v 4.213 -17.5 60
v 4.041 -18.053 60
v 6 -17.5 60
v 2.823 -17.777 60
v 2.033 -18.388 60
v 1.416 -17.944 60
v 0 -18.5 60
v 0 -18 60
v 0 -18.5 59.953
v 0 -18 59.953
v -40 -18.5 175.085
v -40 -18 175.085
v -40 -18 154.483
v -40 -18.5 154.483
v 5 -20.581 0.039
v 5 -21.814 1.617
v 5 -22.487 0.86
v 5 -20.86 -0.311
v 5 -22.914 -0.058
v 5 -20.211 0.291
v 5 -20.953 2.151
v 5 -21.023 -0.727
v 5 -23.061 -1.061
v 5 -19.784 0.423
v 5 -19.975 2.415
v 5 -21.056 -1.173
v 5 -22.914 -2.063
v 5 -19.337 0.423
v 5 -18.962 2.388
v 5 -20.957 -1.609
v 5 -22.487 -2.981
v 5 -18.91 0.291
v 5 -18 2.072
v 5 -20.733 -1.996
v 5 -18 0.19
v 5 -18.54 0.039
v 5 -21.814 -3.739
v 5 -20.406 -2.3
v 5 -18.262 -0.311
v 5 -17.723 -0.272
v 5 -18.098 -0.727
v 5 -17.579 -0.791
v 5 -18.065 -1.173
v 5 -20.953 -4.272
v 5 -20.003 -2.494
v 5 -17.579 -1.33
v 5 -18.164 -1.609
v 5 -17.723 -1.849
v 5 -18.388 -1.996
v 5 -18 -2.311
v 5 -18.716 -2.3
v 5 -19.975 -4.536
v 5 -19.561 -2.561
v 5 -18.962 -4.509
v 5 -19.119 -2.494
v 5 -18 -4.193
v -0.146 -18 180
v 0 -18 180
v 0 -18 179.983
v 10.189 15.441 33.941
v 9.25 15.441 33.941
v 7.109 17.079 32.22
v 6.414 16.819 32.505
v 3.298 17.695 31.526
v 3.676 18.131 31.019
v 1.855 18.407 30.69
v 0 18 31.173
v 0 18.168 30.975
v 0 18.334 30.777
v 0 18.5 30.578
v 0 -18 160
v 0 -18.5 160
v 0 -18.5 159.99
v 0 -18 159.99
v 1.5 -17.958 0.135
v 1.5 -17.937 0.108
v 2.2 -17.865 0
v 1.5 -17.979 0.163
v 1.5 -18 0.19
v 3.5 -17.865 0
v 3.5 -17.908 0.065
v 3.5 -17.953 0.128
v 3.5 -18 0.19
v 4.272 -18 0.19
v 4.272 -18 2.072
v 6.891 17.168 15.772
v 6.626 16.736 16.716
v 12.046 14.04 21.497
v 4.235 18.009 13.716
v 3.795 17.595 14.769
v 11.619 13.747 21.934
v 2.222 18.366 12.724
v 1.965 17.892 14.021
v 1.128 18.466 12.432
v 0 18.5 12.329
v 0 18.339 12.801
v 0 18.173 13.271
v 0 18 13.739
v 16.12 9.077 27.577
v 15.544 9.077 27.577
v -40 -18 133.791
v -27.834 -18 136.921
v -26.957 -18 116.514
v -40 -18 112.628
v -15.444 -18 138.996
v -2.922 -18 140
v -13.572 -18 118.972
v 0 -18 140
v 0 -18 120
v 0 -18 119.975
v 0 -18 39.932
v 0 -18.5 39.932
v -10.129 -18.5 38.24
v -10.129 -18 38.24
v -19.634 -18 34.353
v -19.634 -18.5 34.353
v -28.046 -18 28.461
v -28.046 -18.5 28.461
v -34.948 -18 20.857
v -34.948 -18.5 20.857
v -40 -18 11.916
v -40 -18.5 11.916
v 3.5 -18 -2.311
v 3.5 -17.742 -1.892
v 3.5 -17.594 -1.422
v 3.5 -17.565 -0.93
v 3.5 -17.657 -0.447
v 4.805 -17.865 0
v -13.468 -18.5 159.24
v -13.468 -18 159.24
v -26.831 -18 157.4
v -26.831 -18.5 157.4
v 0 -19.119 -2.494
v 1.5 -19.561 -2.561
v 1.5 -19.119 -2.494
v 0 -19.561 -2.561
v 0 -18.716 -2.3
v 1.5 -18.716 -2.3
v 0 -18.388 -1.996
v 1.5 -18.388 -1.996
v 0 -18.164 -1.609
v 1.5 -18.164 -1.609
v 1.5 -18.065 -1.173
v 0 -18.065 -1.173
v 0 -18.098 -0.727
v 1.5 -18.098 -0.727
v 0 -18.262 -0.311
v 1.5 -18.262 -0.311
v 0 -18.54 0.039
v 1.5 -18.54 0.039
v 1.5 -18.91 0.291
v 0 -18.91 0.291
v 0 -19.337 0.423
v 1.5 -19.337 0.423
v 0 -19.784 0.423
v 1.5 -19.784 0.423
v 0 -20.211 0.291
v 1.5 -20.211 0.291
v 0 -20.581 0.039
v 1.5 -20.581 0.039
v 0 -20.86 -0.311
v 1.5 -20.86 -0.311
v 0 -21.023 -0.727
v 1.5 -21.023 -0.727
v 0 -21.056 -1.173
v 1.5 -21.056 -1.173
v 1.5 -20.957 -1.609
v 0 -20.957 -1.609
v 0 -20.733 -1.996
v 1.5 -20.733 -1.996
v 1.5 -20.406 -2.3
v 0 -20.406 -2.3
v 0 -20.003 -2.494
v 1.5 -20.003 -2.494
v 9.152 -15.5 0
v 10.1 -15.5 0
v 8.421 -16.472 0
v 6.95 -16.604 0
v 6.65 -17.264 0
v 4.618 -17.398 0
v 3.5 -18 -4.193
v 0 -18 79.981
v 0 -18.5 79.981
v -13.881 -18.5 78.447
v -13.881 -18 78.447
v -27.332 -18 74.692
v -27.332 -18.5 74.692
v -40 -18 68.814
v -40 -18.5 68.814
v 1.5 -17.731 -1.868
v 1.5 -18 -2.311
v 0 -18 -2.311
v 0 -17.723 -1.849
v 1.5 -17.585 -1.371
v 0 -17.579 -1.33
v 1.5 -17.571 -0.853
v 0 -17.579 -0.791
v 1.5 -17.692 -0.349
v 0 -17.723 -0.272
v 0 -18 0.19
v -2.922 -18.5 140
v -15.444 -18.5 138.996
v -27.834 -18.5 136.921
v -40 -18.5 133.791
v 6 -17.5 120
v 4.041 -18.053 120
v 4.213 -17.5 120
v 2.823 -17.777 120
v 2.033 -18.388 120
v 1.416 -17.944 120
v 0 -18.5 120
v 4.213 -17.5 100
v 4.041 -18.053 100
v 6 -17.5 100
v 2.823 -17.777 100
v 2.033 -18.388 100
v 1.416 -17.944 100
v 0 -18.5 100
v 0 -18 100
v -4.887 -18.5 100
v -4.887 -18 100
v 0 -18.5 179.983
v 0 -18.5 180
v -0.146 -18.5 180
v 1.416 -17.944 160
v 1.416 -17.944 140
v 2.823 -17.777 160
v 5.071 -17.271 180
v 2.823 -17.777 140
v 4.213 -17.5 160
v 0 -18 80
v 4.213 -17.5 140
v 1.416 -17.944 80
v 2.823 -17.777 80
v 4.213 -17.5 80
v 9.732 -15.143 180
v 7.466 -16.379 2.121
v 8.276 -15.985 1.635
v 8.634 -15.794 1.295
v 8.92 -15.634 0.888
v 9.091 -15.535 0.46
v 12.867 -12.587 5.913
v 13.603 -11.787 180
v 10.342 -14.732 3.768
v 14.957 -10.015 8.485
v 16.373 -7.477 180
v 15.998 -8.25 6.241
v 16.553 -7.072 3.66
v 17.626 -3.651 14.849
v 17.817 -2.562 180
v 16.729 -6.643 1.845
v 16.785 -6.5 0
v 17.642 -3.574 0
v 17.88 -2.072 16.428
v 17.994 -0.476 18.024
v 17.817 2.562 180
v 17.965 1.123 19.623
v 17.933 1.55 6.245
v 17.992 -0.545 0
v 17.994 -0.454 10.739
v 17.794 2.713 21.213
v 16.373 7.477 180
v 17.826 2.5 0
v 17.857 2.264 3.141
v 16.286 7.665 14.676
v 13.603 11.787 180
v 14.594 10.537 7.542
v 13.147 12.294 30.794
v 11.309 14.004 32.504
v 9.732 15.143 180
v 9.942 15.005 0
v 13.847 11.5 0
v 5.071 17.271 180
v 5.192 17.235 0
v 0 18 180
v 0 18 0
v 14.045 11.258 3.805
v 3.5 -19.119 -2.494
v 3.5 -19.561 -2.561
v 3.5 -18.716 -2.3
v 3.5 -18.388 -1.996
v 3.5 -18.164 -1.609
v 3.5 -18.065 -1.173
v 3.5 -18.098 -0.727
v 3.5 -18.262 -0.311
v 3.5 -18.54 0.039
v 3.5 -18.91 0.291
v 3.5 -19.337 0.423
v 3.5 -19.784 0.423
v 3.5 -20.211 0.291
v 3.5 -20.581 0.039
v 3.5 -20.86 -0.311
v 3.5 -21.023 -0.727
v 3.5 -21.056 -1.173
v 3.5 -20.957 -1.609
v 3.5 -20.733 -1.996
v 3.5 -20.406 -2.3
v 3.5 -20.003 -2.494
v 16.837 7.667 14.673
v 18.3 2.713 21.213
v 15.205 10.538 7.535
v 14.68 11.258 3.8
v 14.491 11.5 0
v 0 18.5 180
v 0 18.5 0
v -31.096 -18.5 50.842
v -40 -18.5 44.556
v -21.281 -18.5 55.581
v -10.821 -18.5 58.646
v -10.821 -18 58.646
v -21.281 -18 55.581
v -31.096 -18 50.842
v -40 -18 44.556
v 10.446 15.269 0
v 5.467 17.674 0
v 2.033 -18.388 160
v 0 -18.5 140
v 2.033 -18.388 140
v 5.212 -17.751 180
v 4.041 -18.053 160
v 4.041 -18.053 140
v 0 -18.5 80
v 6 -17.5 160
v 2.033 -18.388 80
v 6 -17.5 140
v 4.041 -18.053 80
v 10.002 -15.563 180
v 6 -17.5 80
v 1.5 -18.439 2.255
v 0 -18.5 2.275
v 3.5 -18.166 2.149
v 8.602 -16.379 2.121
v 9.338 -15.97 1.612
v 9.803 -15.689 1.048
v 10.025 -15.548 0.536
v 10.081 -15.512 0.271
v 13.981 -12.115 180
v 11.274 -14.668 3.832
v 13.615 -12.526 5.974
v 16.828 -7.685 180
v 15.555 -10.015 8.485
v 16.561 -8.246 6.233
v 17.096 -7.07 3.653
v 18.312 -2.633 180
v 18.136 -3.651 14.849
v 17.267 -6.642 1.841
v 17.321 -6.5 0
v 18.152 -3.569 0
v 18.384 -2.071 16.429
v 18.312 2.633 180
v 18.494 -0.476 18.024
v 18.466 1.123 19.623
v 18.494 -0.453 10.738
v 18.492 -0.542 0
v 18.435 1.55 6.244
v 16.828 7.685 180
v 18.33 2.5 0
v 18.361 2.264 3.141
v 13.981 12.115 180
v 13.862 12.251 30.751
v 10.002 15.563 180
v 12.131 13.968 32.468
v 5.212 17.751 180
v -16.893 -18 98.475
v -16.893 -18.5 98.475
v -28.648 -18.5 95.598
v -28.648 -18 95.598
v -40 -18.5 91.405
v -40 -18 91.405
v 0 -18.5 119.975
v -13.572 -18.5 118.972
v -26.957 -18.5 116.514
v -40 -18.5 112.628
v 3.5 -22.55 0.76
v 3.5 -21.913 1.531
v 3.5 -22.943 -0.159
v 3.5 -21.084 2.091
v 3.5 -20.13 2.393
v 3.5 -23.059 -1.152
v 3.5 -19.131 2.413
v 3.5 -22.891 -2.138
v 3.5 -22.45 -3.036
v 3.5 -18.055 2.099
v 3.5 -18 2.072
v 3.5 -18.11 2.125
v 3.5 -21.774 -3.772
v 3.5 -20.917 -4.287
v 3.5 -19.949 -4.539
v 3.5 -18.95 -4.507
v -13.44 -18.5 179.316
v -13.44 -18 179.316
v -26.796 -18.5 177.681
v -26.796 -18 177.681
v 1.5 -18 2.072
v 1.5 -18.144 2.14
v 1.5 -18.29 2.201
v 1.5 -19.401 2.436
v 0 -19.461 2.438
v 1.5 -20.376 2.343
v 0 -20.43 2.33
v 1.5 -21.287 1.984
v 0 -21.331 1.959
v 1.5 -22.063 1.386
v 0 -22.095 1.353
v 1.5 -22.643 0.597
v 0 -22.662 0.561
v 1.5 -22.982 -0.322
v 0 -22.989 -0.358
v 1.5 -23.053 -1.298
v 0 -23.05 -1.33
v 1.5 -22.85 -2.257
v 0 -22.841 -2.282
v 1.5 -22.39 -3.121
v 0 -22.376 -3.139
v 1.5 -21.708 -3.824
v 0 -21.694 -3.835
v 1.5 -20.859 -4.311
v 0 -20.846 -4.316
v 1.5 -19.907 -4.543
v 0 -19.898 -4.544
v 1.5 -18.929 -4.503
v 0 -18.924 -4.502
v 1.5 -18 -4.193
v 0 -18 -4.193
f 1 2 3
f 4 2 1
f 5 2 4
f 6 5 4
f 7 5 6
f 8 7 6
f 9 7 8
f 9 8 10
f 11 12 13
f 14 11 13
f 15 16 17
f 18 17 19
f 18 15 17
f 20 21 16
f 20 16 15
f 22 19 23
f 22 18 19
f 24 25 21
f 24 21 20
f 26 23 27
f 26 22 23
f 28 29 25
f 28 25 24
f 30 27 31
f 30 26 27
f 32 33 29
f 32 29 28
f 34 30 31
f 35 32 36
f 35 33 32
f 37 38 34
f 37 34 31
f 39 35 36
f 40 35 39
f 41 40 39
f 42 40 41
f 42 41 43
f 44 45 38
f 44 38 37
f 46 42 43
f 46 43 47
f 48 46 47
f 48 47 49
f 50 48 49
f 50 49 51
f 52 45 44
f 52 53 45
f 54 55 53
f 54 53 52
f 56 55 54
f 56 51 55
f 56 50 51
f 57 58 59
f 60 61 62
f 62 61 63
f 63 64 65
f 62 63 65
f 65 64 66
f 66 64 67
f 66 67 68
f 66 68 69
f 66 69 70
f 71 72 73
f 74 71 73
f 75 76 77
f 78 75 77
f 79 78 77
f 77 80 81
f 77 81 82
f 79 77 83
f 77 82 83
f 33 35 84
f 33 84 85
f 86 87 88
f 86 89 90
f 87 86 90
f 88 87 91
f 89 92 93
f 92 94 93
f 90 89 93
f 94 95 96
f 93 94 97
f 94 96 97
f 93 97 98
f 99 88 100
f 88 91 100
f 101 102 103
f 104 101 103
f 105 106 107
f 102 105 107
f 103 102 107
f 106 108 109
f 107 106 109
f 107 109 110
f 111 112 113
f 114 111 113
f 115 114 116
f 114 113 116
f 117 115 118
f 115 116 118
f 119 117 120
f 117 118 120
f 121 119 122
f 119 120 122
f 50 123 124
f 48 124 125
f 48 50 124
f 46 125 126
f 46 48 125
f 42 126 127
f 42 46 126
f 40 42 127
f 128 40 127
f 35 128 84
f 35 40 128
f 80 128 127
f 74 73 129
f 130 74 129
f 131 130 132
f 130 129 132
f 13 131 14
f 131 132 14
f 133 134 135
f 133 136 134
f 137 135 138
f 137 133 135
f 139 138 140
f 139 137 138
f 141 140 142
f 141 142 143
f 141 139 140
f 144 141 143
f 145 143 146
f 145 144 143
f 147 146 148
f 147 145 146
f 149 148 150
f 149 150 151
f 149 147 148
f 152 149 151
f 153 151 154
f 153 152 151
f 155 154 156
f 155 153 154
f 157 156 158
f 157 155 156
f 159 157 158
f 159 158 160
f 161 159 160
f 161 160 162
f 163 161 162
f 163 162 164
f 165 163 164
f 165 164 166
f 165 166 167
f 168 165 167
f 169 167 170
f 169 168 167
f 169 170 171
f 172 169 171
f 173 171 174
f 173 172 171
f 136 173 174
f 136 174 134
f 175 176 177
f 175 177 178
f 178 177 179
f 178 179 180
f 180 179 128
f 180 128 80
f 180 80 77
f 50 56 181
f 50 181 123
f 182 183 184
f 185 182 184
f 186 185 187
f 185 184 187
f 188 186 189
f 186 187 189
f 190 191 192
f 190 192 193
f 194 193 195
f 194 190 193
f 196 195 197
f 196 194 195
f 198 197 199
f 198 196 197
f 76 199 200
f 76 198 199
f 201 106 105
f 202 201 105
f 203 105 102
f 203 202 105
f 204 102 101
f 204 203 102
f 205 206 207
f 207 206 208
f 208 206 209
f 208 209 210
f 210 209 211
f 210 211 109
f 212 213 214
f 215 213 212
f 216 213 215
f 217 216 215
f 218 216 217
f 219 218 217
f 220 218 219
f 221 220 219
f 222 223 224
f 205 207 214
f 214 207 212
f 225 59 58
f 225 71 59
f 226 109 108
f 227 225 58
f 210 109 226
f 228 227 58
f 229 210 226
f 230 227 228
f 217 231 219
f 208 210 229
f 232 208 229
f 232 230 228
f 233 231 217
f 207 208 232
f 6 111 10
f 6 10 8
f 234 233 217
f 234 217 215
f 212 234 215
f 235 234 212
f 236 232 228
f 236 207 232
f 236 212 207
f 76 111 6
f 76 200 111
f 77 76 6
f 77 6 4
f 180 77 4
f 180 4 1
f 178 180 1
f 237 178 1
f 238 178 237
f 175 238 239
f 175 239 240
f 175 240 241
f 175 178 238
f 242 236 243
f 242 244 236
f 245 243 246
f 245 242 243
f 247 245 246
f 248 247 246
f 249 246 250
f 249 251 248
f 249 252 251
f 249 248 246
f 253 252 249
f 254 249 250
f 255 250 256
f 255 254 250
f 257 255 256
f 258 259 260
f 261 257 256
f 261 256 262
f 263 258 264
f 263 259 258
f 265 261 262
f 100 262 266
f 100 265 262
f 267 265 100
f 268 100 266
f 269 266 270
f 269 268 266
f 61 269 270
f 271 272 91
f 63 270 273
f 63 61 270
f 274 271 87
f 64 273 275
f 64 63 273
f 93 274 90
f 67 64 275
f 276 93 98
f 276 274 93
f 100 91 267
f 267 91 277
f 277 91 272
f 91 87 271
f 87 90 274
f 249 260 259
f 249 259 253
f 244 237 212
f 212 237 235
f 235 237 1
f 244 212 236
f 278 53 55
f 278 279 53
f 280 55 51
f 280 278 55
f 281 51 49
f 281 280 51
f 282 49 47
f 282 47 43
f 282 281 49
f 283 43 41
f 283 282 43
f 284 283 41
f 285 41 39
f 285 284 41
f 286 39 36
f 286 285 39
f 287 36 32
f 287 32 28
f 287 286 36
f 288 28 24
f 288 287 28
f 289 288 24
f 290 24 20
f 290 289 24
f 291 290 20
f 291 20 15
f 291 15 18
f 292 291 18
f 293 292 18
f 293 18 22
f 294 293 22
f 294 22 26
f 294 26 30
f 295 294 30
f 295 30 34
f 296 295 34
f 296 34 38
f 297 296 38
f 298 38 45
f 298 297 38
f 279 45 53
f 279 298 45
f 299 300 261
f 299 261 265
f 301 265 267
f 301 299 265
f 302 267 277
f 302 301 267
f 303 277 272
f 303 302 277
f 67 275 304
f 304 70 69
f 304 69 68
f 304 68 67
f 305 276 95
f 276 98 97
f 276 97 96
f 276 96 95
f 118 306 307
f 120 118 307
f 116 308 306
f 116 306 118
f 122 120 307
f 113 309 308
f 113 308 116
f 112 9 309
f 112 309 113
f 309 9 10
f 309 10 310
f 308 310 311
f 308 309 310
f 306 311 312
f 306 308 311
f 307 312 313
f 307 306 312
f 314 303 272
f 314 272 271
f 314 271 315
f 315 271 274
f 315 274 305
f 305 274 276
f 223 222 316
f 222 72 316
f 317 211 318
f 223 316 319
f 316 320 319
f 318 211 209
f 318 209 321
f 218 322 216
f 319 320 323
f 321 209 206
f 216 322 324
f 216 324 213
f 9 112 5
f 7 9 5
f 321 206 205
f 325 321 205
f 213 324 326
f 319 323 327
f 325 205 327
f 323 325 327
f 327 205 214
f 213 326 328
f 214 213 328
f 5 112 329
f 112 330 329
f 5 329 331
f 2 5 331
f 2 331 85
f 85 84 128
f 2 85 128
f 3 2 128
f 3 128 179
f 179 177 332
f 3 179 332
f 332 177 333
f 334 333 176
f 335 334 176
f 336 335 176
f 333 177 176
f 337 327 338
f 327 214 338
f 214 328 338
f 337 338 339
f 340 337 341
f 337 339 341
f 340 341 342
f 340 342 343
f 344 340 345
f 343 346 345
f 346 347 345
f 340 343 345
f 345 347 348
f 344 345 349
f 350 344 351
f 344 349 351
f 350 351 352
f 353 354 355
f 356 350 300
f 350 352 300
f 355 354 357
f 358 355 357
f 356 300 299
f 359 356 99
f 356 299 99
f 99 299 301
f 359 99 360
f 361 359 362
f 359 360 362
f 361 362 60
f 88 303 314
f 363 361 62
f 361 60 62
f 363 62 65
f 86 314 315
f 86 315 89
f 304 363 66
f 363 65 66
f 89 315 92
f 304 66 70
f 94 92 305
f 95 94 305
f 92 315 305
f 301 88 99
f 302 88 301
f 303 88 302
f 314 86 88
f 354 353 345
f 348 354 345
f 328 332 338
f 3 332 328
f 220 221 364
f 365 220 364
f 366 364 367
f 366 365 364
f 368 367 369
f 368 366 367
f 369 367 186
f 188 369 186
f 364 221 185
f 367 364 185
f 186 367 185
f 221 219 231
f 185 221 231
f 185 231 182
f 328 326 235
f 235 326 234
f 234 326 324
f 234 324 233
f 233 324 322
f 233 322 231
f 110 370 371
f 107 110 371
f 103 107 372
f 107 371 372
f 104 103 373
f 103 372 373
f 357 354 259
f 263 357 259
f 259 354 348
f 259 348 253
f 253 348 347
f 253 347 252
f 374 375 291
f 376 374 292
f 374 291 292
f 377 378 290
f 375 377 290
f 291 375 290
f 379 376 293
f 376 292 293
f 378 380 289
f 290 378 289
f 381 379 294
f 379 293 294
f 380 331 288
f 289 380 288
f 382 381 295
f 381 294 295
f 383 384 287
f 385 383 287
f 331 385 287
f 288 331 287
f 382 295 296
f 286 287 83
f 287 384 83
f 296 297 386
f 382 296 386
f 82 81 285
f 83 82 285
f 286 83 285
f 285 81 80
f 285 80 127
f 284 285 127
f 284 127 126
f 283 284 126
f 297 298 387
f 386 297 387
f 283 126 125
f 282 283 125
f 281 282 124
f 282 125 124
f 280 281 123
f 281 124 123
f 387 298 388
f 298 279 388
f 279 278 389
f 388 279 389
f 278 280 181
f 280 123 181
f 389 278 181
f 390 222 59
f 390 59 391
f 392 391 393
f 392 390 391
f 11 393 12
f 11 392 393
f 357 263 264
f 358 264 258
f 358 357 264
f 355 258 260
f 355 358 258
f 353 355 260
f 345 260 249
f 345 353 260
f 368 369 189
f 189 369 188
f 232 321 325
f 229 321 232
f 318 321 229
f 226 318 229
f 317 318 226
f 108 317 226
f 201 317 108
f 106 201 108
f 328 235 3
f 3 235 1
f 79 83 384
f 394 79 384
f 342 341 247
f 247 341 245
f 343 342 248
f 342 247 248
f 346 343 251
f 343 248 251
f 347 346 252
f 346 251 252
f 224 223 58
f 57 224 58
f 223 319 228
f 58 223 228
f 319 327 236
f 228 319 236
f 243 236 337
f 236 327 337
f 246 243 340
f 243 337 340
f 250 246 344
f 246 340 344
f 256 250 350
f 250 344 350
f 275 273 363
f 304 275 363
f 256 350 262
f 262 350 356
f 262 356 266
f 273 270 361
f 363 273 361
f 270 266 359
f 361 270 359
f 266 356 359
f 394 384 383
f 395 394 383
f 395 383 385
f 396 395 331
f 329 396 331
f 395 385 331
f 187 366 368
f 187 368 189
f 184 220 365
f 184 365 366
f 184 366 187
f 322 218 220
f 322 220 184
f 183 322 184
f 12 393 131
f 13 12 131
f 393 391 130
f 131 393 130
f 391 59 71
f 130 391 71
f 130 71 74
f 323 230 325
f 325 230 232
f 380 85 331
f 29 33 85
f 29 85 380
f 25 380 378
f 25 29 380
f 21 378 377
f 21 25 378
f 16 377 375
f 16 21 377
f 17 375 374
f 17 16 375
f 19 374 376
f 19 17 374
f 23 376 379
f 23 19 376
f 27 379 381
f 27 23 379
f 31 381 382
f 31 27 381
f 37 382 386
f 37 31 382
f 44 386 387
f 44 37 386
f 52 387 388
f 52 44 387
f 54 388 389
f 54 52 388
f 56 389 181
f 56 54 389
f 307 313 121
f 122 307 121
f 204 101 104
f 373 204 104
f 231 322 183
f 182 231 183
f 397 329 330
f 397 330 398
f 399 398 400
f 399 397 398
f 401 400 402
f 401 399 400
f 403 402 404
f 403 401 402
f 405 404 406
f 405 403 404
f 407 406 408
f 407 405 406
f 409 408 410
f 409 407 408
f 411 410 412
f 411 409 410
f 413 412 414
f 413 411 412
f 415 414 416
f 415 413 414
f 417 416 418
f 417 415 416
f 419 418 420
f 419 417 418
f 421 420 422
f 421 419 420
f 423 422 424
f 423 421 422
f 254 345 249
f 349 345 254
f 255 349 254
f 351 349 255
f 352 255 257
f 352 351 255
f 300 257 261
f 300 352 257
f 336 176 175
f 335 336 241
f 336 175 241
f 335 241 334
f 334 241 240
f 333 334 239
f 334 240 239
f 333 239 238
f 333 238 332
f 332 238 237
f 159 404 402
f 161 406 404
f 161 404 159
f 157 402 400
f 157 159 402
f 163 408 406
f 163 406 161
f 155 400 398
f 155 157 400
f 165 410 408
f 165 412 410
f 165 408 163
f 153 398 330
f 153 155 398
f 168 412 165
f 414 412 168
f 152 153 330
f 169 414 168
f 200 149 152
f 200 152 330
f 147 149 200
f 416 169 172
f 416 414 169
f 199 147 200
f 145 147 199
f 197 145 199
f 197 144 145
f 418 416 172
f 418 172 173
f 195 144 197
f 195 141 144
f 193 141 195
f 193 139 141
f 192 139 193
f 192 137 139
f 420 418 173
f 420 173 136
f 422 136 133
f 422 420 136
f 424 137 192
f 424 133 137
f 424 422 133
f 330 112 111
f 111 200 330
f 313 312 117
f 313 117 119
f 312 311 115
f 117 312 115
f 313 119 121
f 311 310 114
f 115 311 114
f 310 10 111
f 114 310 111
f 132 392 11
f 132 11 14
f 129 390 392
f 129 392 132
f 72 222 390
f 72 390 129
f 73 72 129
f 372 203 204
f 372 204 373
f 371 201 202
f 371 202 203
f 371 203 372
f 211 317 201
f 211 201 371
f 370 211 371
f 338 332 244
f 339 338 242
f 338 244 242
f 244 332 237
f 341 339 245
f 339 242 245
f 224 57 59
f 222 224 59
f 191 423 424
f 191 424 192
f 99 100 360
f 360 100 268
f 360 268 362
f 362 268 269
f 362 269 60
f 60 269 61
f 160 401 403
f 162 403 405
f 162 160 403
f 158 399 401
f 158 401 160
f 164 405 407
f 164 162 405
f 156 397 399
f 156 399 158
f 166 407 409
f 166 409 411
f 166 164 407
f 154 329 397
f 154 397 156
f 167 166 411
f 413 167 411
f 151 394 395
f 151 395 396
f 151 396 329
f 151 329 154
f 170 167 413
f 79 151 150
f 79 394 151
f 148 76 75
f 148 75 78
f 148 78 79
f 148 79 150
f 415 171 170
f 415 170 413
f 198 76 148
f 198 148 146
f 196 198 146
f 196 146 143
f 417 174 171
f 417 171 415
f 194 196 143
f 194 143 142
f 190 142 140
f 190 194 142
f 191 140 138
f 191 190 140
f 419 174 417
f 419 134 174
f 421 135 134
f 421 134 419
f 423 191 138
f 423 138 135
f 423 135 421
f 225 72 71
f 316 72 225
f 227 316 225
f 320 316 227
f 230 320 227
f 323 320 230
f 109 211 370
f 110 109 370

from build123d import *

# Parameters (mm, degrees)
SKETCH_1_R           = 18.5
SKETCH_1_R_2         = 18
EXTRUDE_1_DEPTH      = 180
CUT_EXTRUDE_1_DEPTH  = 30
SKETCH_5_R           = 1.5
EXTRUDE_2_DEPTH      = 5
SKETCH_8_R           = 1.5
CUT_EXTRUDE_2_DEPTH  = 2
SKETCH_9_R           = 1.5
CUT_EXTRUDE_3_DEPTH  = 2
SKETCH_15_W          = 19.647344242
SKETCH_15_H          = 48.423013506
CUT_EXTRUDE_7_DEPTH  = 208.5
SKETCH_16_W          = 20
SKETCH_16_H          = 0.5
EXTRUDE_4_DEPTH      = 40
SKETCH_17_W          = 20
SKETCH_17_H          = 1
CUT_EXTRUDE_8_DEPTH  = 40
EXTRUDE_8_DEPTH      = 0.5
CUT_EXTRUDE_10_DEPTH = 0.5


with BuildPart() as part:
    # 草图1 → 凸台-拉伸1 (new body)
    with BuildSketch(Plane.XY):
        with Locations(Location((0, 0, 0), (0, 0, 180))):
            Circle(SKETCH_1_R)
        with Locations(Location((0, 0, 0), (0, 0, 180))):
            Circle(SKETCH_1_R_2, mode=Mode.SUBTRACT)
    extrude(amount=EXTRUDE_1_DEPTH)

    # 草图4 → 切除-拉伸1 (cut, symmetric)
    with BuildSketch(Plane(origin=(0, 0, 0), x_dir=(0, 0, -1), z_dir=(1, 0, 0))):
        with BuildLine():
            Line((-2.121320344, -16.378679656), (-8.485281374, -10.014718626))
            ThreePointArc((-8.485281374, -10.014718626), (-4.592201188, -7.41344561), (0, -6.5))
            Line((0, -6.5), (0, -15.5))
            ThreePointArc((0, -15.5), (-1.148050297, -15.728361402), (-2.121320344, -16.378679656))
        make_face()
        with BuildLine():
            Line((-23.744748589, 23.215547635), (0, 23.215547635))
            Line((0, 23.215547635), (0, 20.5))
            ThreePointArc((0, 20.5), (-14.924653862, 17.531301768), (-27.577164466, 9.077164466))
            Line((-27.577164466, 9.077164466), (-33.941125497, 15.441125497))
            ThreePointArc((-33.941125497, 15.441125497), (-29.103701262, 19.670336295), (-23.744748589, 23.215547635))
        make_face()
        with BuildLine():
            Line((-14.849242405, -3.650757595), (-21.213203436, 2.713203436))
            ThreePointArc((-21.213203436, 2.713203436), (-11.480502971, 9.216385975), (0, 11.5))
            Line((0, 11.5), (0, 2.5))
            ThreePointArc((0, 2.5), (-8.03635208, 0.901470183), (-14.849242405, -3.650757595))
        make_face()
    extrude(amount=CUT_EXTRUDE_1_DEPTH, both=True, mode=Mode.SUBTRACT)

    # 草图5 → 凸台-拉伸2 (add, symmetric)
    with BuildSketch(Plane(origin=(0, 0, 0), x_dir=(0, 0, -1), z_dir=(1, 0, 0))):
        with BuildLine():
            Line((-0.190075543, -18), (-2.072124505, -18))
            ThreePointArc((-2.072124505, -18), (1.060660172, -23.060660172), (4.193444848, -18))
            Line((4.193444848, -18), (2.311395887, -18))
            ThreePointArc((2.311395887, -18), (1.060660172, -17.560660172), (-0.190075543, -18))
        make_face()
        with Locations((1.060660172, -19.560660172)):
            Circle(SKETCH_5_R, mode=Mode.SUBTRACT)
    extrude(amount=EXTRUDE_2_DEPTH, both=True)

    # 草图8 → 切除-拉伸2 (cut)
    with BuildSketch(Plane(origin=(3.5, 0, 0), x_dir=(0, 0, -1), z_dir=(1, 0, 0))):
        with BuildLine():
            Line((-0.190075543, -18), (-2.072124505, -18))
            ThreePointArc((-2.072124505, -18), (1.060660172, -23.060660172), (4.193444848, -18))
            Line((4.193444848, -18), (2.311395887, -18))
            ThreePointArc((2.311395887, -18), (1.060660172, -17.560660172), (-0.190075543, -18))
        make_face()
        with Locations((1.060660172, -19.560660172)):
            Circle(SKETCH_8_R, mode=Mode.SUBTRACT)
    extrude(amount=-CUT_EXTRUDE_2_DEPTH, mode=Mode.SUBTRACT)

    # 草图9 → 切除-拉伸3 (cut)
    with BuildSketch(Plane(origin=(-1.5, 0, 0), x_dir=(0, 0, -1), z_dir=(1, 0, 0))):
        with BuildLine():
            Line((-2.072124505, -18), (-0.190075543, -18))
            ThreePointArc((-0.190075543, -18), (1.060660172, -17.560660172), (2.311395887, -18))
            Line((2.311395887, -18), (4.193444848, -18))
            ThreePointArc((4.193444848, -18), (1.060660172, -23.060660172), (-2.072124505, -18))
        make_face()
        with Locations((1.060660172, -19.560660172)):
            Circle(SKETCH_9_R, mode=Mode.SUBTRACT)
    extrude(amount=-CUT_EXTRUDE_3_DEPTH, mode=Mode.SUBTRACT)

    # 草图15 → 切除-拉伸7 (cut, symmetric)
    with BuildSketch(Plane(origin=(0, 0, 0), x_dir=(-1, 0, 0), z_dir=(0, 0, -1))):
        with Locations((9.823672121, -2.226084919)):
            Rectangle(SKETCH_15_W, SKETCH_15_H)
    extrude(amount=CUT_EXTRUDE_7_DEPTH, both=True, mode=Mode.SUBTRACT)

    # 草图16 → 凸台-拉伸4 (add)
    with BuildSketch(Plane(origin=(0, 0, 0), x_dir=(0, 0, -1), z_dir=(1, 0, 0))):
        with Locations((-90, -18.25)):
            Rectangle(SKETCH_16_W, SKETCH_16_H)
        with Locations((-50, -18.25)):
            Rectangle(SKETCH_16_W, SKETCH_16_H)
        with Locations((-130, -18.25)):
            Rectangle(SKETCH_16_W, SKETCH_16_H)
        with Locations((-170, -18.25)):
            Rectangle(SKETCH_16_W, SKETCH_16_H)
    extrude(amount=-EXTRUDE_4_DEPTH)

    # 草图17 → 切除-拉伸8 (cut)
    with BuildSketch(Plane(origin=(0, 0, 0), x_dir=(0, 0, -1), z_dir=(1, 0, 0))):
        with Locations((-110, -18)):
            Rectangle(SKETCH_17_W, SKETCH_17_H)
        with Locations((-150, -18)):
            Rectangle(SKETCH_17_W, SKETCH_17_H)
        with Locations((-70, -18)):
            Rectangle(SKETCH_17_W, SKETCH_17_H)
    extrude(amount=CUT_EXTRUDE_8_DEPTH, mode=Mode.SUBTRACT)

    # 草图20 → 凸台-拉伸8 (add)
    with BuildSketch(Plane.XZ.offset(18.5)):
        with BuildLine():
            Line((0, 59.952777719), (0, 39.932309719))
            ThreePointArc((0, 39.932309719), (-24.004305164, 31.641271223), (-40, 11.916015014))
            Line((-40, 11.916015014), (-40, 44.556181889))
            ThreePointArc((-40, 44.556181889), (-21.280533863, 55.581277174), (0, 59.952777719))
        make_face()
        with BuildLine():
            Line((-40, 68.814162833), (-40, 91.125176599))
            ThreePointArc((-40, 91.125176599), (-20.430552708, 97.494887784), (0, 99.97057031))
            Line((0, 99.97057031), (0, 79.980767144))
            ThreePointArc((0, 79.980767144), (-20.682391226, 76.84186512), (-40, 68.814162833))
        make_face()
        with BuildLine():
            Line((0, 180), (0, 159.99002565))
            ThreePointArc((0, 159.99002565), (-20.167840481, 158.455833888), (-40, 154.483305373))
            Line((-40, 154.483305373), (-40, 175.102068383))
            ThreePointArc((-40, 175.102068383), (-20.132883898, 178.636258798), (0, 180))
        make_face()
        with BuildLine():
            Line((-40, 112.628405695), (-40, 133.686346725))
            ThreePointArc((-40, 133.686346725), (-20.218894936, 138.224000128), (0, 139.978623608))
            Line((0, 139.978623608), (0, 119.975235288))
            ThreePointArc((0, 119.975235288), (-20.297894119, 117.923712576), (-40, 112.628405695))
        make_face()
    extrude(amount=-EXTRUDE_8_DEPTH)

    # 草图21 → 切除-拉伸10 (cut)
    with BuildSketch(Plane.XZ.offset(18.5)):
        with BuildLine():
            Line((0, 79.980767144), (0, 59.952777719))
            ThreePointArc((0, 59.952777719), (-21.280533863, 55.581277174), (-40, 44.556181889))
            Line((-40, 44.556181889), (-40, 68.814162833))
            ThreePointArc((-40, 68.814162833), (-20.682391226, 76.84186512), (0, 79.980767144))
        make_face()
        with BuildLine():
            Line((-40, 91.405123559), (-40, 112.628405695))
            ThreePointArc((-40, 112.628405695), (-20.297894119, 117.923712576), (0, 119.975235288))
            Line((0, 119.975235288), (0, 100.22725283))
            ThreePointArc((0, 100.22725283), (-20.428312001, 97.758177426), (-40, 91.405123559))
        make_face()
        with BuildLine():
            Line((0, 159.99002565), (0, 140.07912782))
            ThreePointArc((0, 140.07912782), (-20.218582252, 138.325773675), (-40, 133.791368433))
            Line((-40, 133.791368433), (-40, 154.483305373))
            ThreePointArc((-40, 154.483305373), (-20.167840481, 158.455833888), (0, 159.99002565))
        make_face()
        with BuildLine():
            Line((-40, 175.084831136), (-40, 180))
            Line((-40, 180), (-40, 184.582306451))
            Line((-40, 184.582306451), (-35.32938599, 184.045292069))
            Line((-35.32938599, 184.045292069), (0, 179.983216215))
            ThreePointArc((0, 179.983216215), (-20.132908432, 178.619348164), (-40, 175.084831136))
        make_face()
    extrude(amount=-CUT_EXTRUDE_10_DEPTH, mode=Mode.SUBTRACT)


solid = part.part
